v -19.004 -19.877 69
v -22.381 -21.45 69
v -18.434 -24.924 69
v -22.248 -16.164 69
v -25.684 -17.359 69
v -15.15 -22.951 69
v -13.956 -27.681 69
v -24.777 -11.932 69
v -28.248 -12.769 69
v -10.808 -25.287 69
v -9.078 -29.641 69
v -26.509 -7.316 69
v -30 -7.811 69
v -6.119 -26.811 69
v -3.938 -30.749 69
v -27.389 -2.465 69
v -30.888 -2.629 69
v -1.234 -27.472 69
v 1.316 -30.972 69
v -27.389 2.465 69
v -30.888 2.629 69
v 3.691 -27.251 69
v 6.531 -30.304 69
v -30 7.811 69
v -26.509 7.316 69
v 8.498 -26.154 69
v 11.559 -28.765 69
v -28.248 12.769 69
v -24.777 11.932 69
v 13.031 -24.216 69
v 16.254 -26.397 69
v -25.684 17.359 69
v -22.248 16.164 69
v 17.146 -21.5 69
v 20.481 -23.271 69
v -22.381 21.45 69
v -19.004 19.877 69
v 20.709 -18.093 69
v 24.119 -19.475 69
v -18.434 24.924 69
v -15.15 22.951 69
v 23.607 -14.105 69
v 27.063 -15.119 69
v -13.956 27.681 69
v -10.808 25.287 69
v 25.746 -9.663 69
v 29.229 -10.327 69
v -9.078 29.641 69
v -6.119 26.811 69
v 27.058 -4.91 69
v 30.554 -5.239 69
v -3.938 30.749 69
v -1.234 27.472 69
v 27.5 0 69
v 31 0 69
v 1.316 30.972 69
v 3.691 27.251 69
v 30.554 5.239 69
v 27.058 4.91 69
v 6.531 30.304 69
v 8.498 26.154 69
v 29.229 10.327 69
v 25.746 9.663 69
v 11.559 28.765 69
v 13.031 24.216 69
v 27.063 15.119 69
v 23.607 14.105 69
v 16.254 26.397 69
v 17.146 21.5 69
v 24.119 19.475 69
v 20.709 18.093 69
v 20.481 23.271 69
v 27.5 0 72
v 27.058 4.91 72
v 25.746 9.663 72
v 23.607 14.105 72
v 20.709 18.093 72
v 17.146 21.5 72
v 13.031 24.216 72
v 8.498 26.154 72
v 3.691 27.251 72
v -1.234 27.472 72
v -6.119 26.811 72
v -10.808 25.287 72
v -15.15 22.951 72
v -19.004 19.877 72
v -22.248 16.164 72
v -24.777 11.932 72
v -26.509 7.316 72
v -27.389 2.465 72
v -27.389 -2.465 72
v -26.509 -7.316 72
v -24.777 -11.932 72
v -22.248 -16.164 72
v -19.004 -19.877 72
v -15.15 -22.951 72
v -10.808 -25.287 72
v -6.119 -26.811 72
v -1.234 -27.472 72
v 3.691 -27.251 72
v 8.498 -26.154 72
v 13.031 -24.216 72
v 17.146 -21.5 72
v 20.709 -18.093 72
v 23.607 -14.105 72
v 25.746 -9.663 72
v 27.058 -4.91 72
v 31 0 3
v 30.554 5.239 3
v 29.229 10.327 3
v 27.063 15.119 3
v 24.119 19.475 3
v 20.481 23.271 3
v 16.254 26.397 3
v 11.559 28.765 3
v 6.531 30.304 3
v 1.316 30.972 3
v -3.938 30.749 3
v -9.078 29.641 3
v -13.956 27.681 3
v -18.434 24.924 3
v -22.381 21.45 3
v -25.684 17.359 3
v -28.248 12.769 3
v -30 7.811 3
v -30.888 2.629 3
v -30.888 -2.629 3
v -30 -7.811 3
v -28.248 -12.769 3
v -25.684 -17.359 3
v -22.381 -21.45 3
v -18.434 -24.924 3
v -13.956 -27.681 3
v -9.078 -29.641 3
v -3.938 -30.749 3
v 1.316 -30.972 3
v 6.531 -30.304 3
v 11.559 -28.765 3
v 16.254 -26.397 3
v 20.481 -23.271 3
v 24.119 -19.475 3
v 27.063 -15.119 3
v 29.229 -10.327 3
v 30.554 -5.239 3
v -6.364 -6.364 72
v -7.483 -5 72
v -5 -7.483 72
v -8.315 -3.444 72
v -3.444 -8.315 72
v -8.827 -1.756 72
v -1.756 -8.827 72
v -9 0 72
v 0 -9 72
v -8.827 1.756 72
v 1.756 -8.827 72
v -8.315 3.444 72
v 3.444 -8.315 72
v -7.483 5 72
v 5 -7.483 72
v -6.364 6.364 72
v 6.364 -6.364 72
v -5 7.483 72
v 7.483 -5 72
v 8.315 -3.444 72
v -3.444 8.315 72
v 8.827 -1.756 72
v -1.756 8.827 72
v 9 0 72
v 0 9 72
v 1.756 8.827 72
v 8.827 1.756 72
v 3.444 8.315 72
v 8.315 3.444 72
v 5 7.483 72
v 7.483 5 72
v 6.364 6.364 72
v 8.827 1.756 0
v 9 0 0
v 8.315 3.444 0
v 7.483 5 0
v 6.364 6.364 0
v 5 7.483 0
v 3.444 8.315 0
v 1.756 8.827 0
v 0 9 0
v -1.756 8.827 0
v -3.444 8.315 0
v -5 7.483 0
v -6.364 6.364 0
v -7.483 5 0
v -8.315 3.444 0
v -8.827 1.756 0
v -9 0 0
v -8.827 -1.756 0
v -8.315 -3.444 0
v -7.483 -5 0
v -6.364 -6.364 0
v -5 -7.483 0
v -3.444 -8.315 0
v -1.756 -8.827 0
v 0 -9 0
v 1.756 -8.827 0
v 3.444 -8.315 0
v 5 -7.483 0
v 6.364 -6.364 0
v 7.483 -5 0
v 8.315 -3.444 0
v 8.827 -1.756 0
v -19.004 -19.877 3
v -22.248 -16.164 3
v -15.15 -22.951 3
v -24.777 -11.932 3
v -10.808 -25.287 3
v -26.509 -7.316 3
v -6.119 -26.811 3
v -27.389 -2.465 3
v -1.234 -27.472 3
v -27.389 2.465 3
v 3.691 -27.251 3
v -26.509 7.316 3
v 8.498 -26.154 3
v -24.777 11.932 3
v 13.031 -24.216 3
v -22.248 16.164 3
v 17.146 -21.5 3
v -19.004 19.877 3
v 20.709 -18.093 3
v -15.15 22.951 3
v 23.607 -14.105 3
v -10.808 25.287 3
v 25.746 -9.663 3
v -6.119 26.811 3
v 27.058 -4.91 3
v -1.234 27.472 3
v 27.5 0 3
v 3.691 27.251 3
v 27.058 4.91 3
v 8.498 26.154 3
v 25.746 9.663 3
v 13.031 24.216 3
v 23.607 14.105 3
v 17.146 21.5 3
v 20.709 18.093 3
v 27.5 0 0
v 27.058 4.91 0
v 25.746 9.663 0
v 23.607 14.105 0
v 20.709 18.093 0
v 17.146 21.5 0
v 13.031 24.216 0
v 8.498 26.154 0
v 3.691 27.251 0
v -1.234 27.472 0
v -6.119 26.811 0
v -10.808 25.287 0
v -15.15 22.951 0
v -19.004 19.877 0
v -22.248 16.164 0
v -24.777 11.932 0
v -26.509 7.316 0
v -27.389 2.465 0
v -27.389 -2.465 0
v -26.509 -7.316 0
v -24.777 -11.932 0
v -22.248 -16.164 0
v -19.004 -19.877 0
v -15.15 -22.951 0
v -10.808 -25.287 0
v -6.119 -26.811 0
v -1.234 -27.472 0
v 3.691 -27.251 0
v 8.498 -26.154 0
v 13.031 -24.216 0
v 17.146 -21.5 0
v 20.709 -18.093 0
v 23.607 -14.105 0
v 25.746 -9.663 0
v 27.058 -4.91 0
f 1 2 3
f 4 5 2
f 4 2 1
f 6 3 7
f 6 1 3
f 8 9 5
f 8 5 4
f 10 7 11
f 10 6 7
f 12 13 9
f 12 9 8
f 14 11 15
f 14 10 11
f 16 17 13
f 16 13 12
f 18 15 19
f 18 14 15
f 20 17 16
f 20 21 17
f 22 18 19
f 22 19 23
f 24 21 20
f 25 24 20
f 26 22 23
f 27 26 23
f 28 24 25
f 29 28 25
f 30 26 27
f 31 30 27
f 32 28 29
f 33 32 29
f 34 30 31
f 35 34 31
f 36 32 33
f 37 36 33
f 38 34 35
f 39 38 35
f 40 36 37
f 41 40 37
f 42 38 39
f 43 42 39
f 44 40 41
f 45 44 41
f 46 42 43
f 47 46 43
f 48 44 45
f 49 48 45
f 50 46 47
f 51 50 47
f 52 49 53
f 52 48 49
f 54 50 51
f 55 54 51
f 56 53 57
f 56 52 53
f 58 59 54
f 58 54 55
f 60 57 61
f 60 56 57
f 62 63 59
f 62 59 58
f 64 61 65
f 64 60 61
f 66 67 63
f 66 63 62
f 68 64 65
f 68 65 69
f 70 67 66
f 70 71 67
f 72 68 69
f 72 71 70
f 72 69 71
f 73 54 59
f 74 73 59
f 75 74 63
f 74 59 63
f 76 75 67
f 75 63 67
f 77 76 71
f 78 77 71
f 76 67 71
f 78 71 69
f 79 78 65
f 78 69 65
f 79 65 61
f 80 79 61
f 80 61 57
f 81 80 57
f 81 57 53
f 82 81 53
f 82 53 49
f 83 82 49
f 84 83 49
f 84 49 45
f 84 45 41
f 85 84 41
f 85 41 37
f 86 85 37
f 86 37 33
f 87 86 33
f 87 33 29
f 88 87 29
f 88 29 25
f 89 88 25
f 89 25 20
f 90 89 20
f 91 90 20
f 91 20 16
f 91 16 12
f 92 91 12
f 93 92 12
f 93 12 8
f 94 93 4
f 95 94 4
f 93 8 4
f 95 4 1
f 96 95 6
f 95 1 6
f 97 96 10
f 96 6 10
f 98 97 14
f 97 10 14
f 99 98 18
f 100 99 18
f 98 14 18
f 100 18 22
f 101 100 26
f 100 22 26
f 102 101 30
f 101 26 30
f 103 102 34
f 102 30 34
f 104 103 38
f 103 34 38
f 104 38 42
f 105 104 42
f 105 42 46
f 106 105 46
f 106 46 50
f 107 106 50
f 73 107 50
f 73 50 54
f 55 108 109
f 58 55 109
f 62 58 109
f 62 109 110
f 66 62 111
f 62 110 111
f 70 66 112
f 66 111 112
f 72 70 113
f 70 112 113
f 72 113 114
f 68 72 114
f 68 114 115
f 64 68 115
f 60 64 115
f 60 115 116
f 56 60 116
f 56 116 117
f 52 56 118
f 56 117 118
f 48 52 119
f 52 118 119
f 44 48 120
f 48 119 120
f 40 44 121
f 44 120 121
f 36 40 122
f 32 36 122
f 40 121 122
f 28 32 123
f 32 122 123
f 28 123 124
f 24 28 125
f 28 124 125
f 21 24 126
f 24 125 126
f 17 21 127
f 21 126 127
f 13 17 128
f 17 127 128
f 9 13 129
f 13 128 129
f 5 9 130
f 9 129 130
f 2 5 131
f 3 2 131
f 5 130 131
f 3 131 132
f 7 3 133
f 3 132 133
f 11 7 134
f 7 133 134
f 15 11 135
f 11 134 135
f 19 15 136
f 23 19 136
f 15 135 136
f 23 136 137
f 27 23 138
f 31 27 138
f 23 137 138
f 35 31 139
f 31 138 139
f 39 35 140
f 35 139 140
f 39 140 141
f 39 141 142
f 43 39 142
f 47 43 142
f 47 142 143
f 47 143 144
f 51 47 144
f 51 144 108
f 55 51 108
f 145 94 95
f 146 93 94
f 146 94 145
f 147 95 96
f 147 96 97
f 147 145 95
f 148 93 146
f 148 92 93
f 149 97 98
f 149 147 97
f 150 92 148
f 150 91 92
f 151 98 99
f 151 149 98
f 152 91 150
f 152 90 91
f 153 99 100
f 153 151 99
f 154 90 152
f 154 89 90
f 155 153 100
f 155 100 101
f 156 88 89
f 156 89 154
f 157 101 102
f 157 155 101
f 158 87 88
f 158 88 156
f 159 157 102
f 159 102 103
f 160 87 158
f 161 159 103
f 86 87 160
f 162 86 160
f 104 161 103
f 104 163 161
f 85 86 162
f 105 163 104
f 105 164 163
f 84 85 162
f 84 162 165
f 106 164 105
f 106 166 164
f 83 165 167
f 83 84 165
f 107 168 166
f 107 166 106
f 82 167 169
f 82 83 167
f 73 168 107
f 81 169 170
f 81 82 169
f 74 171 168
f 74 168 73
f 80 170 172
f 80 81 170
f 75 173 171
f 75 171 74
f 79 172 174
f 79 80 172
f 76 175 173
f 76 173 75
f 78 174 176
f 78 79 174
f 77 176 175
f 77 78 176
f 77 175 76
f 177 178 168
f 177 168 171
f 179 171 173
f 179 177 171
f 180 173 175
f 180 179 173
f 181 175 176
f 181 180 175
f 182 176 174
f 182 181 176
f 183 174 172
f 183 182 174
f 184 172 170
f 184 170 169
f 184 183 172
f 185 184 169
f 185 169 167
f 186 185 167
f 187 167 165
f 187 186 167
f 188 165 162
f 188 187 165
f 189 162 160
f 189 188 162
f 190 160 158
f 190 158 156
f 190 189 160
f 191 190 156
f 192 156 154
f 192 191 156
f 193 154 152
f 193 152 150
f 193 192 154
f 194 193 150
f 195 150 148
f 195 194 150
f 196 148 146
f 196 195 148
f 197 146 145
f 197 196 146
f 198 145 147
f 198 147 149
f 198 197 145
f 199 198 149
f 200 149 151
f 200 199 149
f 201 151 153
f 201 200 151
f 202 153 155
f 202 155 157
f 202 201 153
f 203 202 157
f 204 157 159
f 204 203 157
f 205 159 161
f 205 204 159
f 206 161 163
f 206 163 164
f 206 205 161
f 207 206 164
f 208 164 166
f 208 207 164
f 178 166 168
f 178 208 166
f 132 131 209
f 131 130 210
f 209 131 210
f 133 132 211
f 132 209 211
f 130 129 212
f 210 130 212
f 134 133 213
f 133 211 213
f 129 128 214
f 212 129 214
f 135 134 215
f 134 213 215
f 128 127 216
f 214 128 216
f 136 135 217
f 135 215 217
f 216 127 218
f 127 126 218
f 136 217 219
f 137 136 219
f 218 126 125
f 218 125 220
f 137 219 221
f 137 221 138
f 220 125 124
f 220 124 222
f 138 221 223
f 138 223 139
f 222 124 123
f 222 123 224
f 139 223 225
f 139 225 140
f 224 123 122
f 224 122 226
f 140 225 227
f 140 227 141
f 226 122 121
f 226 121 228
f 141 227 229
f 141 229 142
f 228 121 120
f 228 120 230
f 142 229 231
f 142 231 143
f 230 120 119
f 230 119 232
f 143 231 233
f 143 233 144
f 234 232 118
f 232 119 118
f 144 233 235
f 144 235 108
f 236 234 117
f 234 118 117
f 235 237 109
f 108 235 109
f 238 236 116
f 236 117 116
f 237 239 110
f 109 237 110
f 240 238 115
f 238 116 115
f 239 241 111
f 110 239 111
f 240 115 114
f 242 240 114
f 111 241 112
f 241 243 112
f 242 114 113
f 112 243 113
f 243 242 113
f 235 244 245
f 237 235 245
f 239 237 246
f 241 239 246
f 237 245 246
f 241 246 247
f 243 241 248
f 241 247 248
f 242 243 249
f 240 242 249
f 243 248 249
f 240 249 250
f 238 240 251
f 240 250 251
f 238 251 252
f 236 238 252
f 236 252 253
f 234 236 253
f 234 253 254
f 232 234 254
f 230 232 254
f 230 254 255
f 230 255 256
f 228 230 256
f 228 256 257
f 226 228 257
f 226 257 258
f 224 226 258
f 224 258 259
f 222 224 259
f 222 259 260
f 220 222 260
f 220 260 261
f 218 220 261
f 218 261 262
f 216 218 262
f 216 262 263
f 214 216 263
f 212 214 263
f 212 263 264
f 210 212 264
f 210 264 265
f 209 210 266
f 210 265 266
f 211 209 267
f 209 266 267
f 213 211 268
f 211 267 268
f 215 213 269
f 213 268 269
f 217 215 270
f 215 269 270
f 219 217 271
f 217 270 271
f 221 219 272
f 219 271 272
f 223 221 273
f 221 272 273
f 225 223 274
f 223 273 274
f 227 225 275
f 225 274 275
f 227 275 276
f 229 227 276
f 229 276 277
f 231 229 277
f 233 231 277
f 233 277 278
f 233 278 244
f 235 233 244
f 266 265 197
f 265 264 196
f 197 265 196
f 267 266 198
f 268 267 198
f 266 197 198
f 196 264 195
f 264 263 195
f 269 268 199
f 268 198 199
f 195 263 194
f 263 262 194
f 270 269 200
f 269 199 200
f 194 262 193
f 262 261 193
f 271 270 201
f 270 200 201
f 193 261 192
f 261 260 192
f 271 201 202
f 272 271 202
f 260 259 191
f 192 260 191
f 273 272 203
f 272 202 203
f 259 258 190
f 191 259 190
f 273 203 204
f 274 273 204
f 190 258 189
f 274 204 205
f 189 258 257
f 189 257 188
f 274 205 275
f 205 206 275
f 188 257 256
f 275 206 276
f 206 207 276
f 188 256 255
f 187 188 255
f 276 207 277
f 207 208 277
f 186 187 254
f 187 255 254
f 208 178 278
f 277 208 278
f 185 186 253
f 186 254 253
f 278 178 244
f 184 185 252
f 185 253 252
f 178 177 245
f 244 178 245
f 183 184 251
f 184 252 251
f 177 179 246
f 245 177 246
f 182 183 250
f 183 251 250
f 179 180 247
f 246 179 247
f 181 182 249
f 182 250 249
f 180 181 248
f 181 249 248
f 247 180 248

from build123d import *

# Parameters (mm, degrees)
F1_START = 3
F0_R     = 31
F0_R_2   = 27.5
F1_DEPTH = 66
F0_R_3   = 9
F2_DEPTH = 72


with BuildPart() as f1:
    # F0 (on Top) → F1 (new body)
    with BuildSketch(Plane.XY.offset(F1_START)):
        Circle(F0_R)
        Circle(F0_R_2, mode=Mode.SUBTRACT)
    extrude(amount=F1_DEPTH)

    # F0 (on Top) → F2 (join)
    with BuildSketch(Plane.XY):
        Circle(F0_R_2)
        Circle(F0_R_3, mode=Mode.SUBTRACT)
    extrude(amount=F2_DEPTH)


solid = f1.part
